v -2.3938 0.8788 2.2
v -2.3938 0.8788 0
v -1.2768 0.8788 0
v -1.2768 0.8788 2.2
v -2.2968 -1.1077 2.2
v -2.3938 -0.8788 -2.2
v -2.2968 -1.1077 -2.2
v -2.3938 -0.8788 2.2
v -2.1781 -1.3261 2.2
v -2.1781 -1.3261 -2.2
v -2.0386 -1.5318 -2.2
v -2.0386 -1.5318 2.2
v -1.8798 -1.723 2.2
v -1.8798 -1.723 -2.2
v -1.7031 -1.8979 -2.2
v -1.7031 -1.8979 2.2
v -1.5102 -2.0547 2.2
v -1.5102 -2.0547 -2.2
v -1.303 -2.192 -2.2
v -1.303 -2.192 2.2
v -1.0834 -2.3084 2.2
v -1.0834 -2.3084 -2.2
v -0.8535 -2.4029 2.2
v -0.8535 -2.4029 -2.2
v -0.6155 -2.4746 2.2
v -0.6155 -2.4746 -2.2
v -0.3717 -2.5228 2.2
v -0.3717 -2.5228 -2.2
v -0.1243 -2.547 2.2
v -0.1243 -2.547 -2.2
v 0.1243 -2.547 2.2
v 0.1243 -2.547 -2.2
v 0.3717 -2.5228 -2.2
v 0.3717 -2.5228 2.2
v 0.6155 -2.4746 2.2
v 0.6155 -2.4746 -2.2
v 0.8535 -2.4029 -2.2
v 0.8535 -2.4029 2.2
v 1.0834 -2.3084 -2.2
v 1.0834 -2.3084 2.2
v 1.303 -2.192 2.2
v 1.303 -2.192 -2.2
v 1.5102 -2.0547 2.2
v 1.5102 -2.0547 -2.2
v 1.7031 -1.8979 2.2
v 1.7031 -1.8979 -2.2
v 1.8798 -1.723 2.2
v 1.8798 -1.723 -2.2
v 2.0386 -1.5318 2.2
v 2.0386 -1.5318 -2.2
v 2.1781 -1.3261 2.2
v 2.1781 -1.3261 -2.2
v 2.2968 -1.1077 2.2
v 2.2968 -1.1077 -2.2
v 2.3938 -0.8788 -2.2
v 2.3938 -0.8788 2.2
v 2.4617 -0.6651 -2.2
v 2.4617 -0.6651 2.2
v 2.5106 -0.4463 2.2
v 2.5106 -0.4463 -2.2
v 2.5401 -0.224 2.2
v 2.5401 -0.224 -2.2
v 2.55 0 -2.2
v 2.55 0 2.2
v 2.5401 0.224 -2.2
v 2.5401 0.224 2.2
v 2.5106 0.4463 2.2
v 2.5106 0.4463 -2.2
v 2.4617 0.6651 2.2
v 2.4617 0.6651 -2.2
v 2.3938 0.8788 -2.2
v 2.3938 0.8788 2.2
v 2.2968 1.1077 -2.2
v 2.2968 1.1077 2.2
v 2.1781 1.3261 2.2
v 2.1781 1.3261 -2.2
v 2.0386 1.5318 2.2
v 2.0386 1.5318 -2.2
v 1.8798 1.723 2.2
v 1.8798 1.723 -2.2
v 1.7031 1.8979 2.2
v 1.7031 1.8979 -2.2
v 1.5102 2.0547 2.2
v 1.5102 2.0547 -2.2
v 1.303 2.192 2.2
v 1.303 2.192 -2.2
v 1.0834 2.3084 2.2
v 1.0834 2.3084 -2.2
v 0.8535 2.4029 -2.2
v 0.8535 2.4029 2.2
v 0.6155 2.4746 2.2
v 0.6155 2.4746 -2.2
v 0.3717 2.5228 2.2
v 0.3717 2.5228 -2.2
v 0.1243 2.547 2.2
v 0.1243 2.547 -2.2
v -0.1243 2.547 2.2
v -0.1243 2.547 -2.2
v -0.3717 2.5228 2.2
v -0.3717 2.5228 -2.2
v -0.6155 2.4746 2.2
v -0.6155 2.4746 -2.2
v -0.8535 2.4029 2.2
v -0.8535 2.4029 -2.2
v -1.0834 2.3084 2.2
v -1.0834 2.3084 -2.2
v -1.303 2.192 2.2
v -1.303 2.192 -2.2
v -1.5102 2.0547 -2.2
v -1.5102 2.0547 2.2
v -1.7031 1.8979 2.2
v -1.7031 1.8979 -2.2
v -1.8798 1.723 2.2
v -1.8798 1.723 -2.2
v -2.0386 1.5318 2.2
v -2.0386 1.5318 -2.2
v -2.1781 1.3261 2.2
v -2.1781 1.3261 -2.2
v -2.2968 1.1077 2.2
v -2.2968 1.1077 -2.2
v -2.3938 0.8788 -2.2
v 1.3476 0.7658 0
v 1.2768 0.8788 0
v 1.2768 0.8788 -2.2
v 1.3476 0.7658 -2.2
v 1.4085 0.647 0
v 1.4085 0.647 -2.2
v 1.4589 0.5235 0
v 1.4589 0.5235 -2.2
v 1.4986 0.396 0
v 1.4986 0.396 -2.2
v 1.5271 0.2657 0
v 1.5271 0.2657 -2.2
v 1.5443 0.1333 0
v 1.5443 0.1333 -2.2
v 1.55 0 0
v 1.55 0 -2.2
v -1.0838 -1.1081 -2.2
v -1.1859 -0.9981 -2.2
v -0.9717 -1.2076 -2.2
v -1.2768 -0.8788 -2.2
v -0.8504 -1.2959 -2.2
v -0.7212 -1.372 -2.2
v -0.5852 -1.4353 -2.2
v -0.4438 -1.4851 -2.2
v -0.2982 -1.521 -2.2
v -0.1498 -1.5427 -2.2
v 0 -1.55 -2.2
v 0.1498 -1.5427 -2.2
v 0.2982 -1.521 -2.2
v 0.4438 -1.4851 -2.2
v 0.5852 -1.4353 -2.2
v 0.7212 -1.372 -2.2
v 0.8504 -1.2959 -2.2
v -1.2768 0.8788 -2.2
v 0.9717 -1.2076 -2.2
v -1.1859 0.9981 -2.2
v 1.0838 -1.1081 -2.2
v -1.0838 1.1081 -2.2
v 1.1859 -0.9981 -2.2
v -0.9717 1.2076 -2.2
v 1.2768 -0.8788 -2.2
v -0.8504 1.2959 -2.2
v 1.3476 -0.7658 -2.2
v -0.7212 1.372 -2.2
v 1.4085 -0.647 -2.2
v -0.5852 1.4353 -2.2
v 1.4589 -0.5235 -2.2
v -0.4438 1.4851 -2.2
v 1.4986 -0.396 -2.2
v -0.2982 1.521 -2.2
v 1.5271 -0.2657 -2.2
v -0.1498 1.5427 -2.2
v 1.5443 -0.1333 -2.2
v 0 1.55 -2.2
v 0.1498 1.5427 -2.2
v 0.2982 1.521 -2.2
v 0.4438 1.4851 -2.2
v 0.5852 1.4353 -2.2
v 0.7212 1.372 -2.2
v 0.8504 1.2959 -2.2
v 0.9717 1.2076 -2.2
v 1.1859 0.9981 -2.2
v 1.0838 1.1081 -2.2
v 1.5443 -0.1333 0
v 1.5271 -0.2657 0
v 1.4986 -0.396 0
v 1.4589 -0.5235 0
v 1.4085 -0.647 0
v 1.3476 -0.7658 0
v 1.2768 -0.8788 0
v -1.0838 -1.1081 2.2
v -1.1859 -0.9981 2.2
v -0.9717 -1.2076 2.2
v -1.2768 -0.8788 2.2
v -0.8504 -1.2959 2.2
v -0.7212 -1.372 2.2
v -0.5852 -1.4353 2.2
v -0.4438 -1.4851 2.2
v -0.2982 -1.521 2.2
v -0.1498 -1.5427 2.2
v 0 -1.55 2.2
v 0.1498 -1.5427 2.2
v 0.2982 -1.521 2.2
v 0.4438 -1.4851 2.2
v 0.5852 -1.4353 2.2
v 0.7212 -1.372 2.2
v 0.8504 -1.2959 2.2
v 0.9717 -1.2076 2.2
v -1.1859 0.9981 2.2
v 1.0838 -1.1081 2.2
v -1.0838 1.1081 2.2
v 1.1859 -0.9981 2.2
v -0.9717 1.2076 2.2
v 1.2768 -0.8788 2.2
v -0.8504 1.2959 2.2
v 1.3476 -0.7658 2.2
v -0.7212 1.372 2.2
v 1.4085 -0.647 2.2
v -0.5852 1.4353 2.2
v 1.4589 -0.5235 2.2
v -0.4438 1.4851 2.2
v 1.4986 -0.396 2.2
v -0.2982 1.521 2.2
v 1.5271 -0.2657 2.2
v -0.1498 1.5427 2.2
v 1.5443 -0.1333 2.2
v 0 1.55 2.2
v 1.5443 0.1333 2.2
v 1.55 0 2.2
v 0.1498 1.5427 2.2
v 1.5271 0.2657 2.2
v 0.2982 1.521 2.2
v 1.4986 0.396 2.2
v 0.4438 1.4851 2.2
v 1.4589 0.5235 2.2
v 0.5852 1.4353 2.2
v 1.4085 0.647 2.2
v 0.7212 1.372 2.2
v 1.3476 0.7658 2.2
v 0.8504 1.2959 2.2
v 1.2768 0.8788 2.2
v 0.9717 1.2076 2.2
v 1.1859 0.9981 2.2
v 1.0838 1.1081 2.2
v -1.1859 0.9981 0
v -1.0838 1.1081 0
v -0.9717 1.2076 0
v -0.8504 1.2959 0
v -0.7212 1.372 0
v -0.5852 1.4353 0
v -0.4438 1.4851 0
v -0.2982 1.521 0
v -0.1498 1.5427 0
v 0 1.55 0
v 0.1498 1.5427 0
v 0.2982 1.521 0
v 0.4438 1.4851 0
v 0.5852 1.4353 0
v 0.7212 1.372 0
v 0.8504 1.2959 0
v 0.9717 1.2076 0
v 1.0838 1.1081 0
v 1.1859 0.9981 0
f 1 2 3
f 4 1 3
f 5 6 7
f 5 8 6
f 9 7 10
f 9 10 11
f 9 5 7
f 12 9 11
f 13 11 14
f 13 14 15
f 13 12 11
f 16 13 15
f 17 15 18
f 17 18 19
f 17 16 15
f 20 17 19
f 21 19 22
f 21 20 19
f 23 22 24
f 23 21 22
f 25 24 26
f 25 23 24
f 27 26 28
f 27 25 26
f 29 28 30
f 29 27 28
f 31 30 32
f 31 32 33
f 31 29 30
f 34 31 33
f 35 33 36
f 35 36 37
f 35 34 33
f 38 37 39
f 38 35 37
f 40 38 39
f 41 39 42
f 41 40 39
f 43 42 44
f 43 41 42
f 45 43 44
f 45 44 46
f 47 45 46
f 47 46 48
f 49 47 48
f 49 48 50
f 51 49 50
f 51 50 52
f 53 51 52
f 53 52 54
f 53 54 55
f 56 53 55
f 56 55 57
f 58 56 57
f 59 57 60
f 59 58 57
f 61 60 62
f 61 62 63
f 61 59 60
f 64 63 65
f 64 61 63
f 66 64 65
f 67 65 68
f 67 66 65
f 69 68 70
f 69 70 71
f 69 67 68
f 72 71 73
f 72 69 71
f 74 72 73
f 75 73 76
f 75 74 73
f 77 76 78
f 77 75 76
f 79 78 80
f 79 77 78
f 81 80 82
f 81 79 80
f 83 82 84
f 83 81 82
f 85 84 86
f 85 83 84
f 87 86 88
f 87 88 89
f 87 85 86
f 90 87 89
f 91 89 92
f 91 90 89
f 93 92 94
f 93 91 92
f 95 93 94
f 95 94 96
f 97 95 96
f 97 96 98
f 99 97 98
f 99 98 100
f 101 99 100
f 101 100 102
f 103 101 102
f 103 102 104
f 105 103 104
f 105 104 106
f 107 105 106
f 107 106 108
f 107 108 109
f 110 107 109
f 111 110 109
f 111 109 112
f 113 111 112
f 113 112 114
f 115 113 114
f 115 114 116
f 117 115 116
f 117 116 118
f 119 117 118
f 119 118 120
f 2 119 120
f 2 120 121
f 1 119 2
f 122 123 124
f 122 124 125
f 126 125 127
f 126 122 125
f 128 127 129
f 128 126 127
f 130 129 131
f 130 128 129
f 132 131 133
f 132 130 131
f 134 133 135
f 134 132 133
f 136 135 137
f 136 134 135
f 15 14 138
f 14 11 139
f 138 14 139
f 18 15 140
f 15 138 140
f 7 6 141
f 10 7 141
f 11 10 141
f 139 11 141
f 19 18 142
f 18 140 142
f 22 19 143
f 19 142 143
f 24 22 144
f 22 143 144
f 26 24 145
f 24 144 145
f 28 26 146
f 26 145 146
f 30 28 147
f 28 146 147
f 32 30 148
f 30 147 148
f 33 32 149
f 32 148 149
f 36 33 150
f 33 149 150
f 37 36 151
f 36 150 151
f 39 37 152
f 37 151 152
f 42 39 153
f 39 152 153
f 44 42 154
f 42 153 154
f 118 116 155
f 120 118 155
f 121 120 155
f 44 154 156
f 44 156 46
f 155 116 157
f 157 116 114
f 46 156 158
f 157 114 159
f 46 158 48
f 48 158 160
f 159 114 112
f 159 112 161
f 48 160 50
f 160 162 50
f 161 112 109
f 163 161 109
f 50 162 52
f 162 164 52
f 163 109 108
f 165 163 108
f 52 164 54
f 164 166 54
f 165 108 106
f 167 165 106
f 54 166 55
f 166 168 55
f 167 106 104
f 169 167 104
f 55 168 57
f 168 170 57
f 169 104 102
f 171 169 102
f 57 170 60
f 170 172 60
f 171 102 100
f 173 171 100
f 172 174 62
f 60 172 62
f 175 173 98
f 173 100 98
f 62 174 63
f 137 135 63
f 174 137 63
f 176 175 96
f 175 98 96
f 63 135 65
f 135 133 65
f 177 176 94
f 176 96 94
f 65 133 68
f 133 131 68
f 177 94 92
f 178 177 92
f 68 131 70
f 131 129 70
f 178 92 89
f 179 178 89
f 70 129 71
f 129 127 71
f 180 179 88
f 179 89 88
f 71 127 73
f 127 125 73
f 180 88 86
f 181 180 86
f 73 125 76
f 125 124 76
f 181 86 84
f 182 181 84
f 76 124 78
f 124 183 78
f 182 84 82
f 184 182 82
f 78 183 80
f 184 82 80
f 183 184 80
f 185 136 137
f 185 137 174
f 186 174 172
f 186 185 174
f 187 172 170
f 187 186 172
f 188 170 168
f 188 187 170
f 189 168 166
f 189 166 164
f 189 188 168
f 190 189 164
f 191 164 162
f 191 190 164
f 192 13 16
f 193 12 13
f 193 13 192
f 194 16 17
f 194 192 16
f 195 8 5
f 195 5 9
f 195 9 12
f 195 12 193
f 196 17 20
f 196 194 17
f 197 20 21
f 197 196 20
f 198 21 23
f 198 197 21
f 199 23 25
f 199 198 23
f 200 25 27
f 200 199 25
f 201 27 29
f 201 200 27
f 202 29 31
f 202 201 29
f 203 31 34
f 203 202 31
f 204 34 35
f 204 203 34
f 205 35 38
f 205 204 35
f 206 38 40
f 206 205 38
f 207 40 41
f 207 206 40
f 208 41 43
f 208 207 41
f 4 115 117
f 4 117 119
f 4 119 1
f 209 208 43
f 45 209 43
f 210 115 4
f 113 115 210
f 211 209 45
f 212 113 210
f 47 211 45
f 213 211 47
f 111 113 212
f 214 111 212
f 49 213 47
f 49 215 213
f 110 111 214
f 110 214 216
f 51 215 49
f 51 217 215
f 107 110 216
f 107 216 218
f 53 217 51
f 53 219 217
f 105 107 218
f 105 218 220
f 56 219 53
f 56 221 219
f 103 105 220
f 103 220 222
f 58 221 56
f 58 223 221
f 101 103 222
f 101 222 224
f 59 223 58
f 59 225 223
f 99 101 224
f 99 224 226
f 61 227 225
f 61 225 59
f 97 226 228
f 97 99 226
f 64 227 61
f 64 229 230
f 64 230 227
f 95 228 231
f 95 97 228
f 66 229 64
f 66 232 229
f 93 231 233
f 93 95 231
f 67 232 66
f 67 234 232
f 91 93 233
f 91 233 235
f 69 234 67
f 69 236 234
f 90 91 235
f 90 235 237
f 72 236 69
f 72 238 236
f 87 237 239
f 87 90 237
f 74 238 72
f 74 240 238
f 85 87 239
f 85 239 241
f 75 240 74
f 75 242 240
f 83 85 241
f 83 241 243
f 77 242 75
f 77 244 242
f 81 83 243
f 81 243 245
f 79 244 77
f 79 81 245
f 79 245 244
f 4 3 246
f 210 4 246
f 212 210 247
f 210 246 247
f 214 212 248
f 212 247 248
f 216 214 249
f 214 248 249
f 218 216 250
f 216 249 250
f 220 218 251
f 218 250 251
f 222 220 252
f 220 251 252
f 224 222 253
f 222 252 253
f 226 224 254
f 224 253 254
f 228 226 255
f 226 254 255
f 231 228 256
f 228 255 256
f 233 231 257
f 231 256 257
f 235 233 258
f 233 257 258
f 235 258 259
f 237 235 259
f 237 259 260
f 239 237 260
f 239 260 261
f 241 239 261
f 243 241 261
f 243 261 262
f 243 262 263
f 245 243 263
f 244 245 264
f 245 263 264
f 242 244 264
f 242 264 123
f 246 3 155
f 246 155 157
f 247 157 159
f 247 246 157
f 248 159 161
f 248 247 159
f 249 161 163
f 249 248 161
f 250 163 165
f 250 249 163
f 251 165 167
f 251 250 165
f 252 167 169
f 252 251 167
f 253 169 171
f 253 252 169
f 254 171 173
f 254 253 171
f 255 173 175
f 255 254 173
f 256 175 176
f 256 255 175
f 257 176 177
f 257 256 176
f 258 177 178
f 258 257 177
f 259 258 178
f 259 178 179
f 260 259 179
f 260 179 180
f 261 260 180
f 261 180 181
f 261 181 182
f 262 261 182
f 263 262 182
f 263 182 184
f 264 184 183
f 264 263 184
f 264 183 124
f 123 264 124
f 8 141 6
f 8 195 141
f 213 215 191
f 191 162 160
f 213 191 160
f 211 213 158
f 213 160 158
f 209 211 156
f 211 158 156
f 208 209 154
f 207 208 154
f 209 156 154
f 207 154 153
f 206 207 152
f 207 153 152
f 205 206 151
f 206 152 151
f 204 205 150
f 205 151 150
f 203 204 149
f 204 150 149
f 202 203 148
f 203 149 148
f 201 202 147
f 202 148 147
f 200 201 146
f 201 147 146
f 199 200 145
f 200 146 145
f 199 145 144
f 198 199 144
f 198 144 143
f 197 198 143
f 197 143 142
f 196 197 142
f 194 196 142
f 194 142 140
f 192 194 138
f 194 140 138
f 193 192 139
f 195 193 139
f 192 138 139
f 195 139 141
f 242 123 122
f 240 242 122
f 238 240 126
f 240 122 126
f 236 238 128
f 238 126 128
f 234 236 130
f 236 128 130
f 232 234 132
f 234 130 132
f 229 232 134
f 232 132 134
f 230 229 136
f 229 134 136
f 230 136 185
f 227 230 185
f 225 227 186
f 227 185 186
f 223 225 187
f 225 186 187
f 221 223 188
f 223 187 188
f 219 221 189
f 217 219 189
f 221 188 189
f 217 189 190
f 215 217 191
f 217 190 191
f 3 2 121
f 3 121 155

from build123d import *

# Parameters (mm, degrees)
F1_DEPTH = 2.2


with BuildPart() as f1:
    # F0 (on Top) → F1 (new body, symmetric)
    with BuildSketch(Plane.XY):
        with BuildLine():
            ThreePointArc((-2.3937715127, -0.8788389756), (0, -2.55), (2.3937715127, -0.8788389756))
            Line((2.3937715127, -0.8788389756), (1.2767701653, -0.8788389756))
            ThreePointArc((1.2767701653, -0.8788389756), (0, -1.55), (-1.2767701653, -0.8788389756))
            Line((-1.2767701653, -0.8788389756), (-2.3937715127, -0.8788389756))
        make_face()
        with BuildLine():
            Line((1.2767701653, 0.8788389756), (2.3937715127, 0.8788389756))
            ThreePointArc((2.3937715127, 0.8788389756), (0, 2.55), (-2.3937715127, 0.8788389756))
            Line((-2.3937715127, 0.8788389756), (-1.2767701653, 0.8788389756))
            ThreePointArc((-1.2767701653, 0.8788389756), (0, 1.55), (1.2767701653, 0.8788389756))
        make_face()
        with BuildLine():
            ThreePointArc((2.3937715127, -0.8788389756), (2.5106390977, -0.4463085494), (2.55, 0))
            ThreePointArc((2.55, 0), (2.5106390977, 0.4463085494), (2.3937715127, 0.8788389756))
            Line((2.3937715127, 0.8788389756), (1.2767701653, 0.8788389756))
            ThreePointArc((1.2767701653, 0.8788389756), (1.4801171839, 0.4601664067), (1.55, 0))
            ThreePointArc((1.55, 0), (1.4801171839, -0.4601664067), (1.2767701653, -0.8788389756))
            Line((1.2767701653, -0.8788389756), (2.3937715127, -0.8788389756))
        make_face()
    extrude(amount=F1_DEPTH, both=True)


solid = f1.part
